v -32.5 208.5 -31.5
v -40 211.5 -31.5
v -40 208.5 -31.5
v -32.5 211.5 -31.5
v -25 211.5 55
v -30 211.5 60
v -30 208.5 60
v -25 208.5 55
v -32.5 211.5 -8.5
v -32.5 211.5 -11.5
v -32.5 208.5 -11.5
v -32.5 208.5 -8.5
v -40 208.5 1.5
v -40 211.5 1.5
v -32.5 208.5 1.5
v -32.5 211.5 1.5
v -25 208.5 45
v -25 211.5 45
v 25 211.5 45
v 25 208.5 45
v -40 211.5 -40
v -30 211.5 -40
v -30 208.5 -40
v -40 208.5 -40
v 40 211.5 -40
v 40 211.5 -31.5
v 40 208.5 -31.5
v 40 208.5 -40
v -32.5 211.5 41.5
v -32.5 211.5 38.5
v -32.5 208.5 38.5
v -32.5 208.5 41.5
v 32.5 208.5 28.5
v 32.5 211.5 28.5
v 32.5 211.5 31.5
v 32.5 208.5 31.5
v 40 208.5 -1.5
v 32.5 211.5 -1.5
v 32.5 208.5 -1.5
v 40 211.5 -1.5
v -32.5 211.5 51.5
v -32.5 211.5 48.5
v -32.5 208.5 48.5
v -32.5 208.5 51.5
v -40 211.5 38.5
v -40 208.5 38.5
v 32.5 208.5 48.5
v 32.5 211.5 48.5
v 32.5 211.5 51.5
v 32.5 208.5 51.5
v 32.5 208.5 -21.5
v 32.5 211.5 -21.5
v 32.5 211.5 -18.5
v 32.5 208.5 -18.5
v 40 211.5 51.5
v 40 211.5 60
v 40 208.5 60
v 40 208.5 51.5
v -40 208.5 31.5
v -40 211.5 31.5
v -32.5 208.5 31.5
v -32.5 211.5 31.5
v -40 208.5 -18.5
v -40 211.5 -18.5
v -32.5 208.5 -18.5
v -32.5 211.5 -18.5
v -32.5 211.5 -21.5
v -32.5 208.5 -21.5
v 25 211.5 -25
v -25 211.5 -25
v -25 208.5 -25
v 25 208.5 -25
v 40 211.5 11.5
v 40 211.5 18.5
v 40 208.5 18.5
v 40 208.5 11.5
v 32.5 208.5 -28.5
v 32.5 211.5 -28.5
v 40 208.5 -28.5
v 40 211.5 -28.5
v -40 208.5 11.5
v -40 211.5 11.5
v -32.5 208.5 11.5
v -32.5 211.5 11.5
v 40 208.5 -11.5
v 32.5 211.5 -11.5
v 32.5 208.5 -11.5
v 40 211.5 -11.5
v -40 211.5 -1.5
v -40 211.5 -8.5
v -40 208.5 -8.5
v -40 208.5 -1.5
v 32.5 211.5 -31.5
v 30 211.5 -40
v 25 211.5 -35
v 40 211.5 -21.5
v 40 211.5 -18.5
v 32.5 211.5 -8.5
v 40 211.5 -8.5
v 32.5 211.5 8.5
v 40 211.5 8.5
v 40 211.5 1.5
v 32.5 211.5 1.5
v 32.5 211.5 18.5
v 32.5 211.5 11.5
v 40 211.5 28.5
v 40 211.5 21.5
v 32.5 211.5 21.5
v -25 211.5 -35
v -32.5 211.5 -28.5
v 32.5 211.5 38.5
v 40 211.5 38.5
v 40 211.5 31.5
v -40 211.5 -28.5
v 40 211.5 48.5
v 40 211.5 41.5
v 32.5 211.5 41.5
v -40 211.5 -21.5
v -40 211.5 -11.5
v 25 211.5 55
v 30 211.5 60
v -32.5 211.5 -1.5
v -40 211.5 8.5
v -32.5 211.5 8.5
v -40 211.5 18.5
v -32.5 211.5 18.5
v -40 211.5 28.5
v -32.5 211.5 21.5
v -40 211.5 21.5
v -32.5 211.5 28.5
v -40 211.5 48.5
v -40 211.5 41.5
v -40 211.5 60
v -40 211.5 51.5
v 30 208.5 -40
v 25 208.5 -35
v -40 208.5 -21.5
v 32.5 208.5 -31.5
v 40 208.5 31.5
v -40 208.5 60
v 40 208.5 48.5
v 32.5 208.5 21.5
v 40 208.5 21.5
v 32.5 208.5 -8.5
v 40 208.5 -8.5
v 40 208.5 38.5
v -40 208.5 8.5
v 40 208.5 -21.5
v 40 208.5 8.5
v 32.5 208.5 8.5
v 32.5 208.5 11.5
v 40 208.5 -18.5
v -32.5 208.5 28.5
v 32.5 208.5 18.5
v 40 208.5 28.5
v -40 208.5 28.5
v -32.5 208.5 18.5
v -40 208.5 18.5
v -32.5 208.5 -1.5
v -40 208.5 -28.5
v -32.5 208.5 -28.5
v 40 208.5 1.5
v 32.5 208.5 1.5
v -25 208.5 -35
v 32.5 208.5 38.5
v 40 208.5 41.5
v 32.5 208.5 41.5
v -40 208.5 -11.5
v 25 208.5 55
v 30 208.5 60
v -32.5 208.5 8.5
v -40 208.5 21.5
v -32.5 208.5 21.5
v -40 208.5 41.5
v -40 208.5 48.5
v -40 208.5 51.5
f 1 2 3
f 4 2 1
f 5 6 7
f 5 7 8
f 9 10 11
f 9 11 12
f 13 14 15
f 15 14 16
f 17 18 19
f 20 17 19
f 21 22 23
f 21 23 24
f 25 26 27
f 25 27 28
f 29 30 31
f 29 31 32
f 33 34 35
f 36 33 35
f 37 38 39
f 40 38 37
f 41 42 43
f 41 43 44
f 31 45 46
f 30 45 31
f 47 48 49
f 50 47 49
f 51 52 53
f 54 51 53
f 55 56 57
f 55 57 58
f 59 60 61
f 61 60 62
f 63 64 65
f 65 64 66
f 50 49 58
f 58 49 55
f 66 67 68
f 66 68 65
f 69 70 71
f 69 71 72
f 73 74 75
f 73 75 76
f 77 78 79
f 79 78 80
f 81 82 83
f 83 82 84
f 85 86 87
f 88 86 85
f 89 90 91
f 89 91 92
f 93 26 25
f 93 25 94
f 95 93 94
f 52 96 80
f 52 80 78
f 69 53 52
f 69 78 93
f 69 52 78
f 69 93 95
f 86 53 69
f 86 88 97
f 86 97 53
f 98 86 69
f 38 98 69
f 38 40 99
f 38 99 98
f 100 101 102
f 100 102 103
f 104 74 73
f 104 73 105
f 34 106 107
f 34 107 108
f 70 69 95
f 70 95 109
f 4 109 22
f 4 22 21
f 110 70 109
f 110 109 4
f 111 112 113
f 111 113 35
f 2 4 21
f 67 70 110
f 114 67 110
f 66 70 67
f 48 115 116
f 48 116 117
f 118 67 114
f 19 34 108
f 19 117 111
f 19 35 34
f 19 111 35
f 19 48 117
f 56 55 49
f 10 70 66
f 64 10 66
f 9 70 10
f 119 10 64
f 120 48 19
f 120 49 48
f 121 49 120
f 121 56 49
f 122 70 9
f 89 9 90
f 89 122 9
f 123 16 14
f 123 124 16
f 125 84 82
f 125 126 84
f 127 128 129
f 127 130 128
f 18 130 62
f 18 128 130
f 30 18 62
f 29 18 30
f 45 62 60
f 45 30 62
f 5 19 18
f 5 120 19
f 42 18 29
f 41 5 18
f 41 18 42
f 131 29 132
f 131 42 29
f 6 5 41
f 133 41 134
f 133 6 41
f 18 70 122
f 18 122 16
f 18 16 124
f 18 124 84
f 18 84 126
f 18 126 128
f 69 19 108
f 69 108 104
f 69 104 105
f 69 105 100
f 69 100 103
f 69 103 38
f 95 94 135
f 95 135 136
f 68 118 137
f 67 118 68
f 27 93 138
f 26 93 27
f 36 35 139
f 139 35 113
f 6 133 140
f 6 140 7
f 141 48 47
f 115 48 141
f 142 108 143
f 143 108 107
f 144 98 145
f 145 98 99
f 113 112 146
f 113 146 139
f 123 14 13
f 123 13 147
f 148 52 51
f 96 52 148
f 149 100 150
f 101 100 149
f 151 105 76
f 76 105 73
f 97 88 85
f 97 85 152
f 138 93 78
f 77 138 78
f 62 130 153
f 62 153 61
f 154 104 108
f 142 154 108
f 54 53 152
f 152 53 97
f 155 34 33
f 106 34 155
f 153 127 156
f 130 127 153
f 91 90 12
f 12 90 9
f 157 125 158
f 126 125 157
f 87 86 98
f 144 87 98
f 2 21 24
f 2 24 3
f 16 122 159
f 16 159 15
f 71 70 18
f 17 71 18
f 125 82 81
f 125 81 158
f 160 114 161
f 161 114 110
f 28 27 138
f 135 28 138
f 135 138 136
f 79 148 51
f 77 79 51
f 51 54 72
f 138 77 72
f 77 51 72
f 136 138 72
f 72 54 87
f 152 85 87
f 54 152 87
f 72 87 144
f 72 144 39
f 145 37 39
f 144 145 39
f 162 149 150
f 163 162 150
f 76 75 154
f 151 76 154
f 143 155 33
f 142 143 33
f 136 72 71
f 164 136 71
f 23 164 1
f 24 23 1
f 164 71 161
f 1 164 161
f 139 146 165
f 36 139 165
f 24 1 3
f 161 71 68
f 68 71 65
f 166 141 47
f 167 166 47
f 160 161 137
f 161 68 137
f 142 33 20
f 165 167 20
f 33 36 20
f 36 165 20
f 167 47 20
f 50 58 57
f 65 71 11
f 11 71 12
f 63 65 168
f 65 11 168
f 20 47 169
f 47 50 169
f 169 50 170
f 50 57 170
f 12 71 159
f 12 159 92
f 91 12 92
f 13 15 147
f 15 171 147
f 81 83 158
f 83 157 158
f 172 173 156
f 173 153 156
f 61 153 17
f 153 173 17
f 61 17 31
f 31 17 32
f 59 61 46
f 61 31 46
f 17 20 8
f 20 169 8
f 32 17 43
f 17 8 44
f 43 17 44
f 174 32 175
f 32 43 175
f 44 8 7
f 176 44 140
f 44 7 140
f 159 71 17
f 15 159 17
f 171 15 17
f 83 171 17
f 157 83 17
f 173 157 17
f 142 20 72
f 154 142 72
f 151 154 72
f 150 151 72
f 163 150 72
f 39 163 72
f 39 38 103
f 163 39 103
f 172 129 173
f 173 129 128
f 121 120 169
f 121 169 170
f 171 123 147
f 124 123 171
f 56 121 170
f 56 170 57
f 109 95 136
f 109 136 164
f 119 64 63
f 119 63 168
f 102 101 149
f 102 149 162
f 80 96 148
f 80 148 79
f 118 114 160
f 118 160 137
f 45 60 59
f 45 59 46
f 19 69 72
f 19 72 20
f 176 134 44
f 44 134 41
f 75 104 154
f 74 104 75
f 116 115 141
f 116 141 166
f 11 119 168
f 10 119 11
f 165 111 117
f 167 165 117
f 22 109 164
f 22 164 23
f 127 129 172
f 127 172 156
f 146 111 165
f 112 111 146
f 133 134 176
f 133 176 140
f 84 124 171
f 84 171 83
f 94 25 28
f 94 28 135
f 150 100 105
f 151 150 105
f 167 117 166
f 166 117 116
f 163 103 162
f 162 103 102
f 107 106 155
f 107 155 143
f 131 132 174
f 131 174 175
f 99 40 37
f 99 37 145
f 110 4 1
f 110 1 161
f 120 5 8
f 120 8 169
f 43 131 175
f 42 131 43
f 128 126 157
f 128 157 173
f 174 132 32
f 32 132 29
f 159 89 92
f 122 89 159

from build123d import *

# Parameters (mm, degrees)
SKETCH005_W            = 50
SKETCH005_H            = 70
PAD003_DEPTH           = 3
SKETCH006_W            = 10
SKETCH006_H            = 3
POCKET002_DEPTH        = 5
LINEARPATTERN003_COUNT = 9
LINEARPATTERN003_PITCH = 10


with BuildPart() as part:
    # Sketch005 → Pad003 (new body)
    with BuildSketch(Plane.XZ):
        Polygon((-40, 50), (-30, 50), (-25, 45), (25, 45), (30, 50), (40, 50), (40, -50), (30, -50), (25, -45), (-25, -45), (-30, -50), (-40, -50), align=None)
        Rectangle(SKETCH005_W, SKETCH005_H, mode=Mode.SUBTRACT)
    extrude(amount=PAD003_DEPTH)

    # Sketch006 → Pocket002 (cut)
    with BuildSketch(Plane(origin=(0, 0, -40), x_dir=(1, 0, 0), z_dir=(0, -1, 0))):
        with Locations((-37.5, 0)):
            Rectangle(SKETCH006_W, SKETCH006_H)
        with Locations((37.5, 0)):
            Rectangle(SKETCH006_W, SKETCH006_H)
    pocket002 = extrude(amount=POCKET002_DEPTH, mode=Mode.SUBTRACT)

    # LinearPattern003: Pocket002 ×9
    with Locations(*[(0, 0, i * LINEARPATTERN003_PITCH) for i in range(1, LINEARPATTERN003_COUNT)]):
        add(pocket002, mode=Mode.SUBTRACT)


with BuildPart() as part_1:
    # Body002 placement: moved
    add(part.part.moved(Location((0, 11.5, 10))))


with BuildPart() as part_2:
    # Body003 placement: moved
    add(part_1.part.moved(Location((0, 200, 0))))


solid = part_2.part
